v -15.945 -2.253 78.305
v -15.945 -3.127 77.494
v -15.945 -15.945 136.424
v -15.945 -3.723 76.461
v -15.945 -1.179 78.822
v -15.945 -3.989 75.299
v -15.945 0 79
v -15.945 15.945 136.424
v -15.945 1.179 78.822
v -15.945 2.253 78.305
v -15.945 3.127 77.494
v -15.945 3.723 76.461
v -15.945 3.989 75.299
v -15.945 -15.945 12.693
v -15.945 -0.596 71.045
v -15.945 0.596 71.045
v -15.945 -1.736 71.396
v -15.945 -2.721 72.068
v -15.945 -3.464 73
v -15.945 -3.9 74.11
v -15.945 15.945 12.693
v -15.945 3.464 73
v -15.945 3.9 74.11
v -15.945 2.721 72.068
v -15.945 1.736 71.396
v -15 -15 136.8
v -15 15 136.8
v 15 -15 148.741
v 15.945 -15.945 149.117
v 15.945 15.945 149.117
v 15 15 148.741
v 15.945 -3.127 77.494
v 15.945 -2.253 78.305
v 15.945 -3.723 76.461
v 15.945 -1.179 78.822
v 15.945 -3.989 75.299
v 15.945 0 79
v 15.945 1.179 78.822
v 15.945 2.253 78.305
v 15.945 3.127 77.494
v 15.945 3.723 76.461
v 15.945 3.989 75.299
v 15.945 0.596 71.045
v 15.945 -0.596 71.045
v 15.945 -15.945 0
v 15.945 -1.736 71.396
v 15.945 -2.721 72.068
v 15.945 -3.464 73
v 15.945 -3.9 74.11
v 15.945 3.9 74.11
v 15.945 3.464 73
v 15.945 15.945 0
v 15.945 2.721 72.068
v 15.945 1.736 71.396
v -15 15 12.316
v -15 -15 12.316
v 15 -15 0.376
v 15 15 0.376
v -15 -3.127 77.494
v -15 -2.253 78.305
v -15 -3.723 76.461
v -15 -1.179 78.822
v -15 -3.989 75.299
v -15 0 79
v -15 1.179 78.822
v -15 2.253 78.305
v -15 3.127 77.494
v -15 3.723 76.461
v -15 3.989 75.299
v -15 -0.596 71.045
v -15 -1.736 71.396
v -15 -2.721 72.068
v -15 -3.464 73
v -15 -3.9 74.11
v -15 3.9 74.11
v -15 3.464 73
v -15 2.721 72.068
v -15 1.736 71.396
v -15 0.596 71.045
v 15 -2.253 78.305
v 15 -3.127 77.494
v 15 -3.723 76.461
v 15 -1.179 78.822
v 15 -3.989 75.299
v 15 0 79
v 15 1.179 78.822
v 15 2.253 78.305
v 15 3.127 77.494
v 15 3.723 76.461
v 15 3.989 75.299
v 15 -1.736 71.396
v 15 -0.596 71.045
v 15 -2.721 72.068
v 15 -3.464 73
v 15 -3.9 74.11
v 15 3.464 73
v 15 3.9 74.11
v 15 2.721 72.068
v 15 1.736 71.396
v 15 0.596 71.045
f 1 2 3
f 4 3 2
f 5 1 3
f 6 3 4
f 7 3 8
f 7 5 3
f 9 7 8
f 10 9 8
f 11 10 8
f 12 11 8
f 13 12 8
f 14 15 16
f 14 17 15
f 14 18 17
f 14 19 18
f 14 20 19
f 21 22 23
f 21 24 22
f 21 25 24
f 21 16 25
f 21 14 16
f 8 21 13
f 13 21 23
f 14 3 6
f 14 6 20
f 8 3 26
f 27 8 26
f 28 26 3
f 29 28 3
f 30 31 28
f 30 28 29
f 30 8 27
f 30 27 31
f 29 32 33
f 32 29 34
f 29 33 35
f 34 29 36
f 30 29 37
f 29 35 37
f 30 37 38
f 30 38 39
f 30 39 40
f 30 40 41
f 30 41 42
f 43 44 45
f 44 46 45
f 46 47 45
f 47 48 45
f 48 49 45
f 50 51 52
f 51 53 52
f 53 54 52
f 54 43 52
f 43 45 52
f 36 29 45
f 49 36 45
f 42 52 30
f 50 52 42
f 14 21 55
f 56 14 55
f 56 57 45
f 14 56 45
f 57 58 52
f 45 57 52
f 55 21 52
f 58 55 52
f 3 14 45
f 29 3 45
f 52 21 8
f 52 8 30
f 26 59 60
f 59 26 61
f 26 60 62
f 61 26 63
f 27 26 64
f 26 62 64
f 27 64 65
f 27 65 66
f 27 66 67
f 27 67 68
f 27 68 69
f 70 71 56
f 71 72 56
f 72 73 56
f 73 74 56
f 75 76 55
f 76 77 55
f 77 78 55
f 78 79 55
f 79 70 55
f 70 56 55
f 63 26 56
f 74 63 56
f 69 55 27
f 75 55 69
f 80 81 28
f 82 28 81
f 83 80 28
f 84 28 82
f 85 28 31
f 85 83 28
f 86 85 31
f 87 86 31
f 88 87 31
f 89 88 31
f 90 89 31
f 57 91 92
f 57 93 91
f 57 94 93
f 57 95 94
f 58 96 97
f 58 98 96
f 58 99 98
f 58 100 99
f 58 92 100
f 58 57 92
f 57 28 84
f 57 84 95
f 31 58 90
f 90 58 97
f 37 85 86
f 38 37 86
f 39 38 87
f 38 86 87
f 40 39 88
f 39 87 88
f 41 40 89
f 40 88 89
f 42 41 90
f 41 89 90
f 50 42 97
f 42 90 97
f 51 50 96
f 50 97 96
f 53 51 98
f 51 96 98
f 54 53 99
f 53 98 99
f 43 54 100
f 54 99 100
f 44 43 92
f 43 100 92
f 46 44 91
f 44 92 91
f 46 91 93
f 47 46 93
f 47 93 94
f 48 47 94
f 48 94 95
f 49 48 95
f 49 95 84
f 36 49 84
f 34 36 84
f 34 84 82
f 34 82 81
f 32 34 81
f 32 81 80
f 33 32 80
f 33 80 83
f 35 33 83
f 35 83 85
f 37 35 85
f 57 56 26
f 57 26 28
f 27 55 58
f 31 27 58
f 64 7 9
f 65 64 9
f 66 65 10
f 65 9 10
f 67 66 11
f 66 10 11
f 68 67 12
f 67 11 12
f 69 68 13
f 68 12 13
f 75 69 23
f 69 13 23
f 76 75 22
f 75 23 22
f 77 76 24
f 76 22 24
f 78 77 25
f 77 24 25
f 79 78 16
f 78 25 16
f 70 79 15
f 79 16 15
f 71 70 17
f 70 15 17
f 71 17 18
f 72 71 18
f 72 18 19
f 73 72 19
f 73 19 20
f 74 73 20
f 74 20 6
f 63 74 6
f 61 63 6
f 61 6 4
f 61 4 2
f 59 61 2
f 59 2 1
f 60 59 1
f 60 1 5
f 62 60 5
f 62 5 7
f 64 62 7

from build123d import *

# Parameters (mm, degrees)
ESBO_O1_W                = 31.890446896
ESBO_O1_H                = 31.890446896
ESBO_O1_W_2              = 30
ESBO_O1_H_2              = 30
RESSALTO_EXTRUS_O1_DEPTH = 149.11688245
CORTE_EXTRUS_O1_DEPTH    = 154.320238017
ESBO_O4_R                = 4
CORTE_EXTRUS_O2_DEPTH    = 32


with BuildPart() as part:
    # Esboço1 → Ressalto-extrusão1 (new body)
    with BuildSketch(Plane.XY):
        Rectangle(ESBO_O1_W, ESBO_O1_H)
        Rectangle(ESBO_O1_W_2, ESBO_O1_H_2, mode=Mode.SUBTRACT)
    extrude(amount=RESSALTO_EXTRUS_O1_DEPTH)

    # Esboço3 → Corte-extrusão1 (cut, symmetric)
    with BuildSketch(Plane(origin=(0, 15.945223448, 0), x_dir=(1, 0, 0), z_dir=(0, 1, 0))):
        Polygon((-15.945223448, -12.692594834), (15.945223448, 0), (-15.945223448, 0), align=None)
    corte_extrus_o1 = extrude(amount=CORTE_EXTRUS_O1_DEPTH, both=True, mode=Mode.SUBTRACT)

    # Espelhar5: Corte-extrusão1 across plane
    add(corte_extrus_o1.mirror(Plane(origin=(0, 0, 74.558441225), x_dir=(1, 0, 0), z_dir=(0, 0, -1))), mode=Mode.SUBTRACT)

    # Esboço4 → Corte-extrusão2 (cut)
    with BuildSketch(Plane.ZY.offset(15.945223448)):
        with Locations((75, 0)):
            Circle(ESBO_O4_R)
    extrude(amount=-CORTE_EXTRUS_O2_DEPTH, mode=Mode.SUBTRACT)


solid = part.part
